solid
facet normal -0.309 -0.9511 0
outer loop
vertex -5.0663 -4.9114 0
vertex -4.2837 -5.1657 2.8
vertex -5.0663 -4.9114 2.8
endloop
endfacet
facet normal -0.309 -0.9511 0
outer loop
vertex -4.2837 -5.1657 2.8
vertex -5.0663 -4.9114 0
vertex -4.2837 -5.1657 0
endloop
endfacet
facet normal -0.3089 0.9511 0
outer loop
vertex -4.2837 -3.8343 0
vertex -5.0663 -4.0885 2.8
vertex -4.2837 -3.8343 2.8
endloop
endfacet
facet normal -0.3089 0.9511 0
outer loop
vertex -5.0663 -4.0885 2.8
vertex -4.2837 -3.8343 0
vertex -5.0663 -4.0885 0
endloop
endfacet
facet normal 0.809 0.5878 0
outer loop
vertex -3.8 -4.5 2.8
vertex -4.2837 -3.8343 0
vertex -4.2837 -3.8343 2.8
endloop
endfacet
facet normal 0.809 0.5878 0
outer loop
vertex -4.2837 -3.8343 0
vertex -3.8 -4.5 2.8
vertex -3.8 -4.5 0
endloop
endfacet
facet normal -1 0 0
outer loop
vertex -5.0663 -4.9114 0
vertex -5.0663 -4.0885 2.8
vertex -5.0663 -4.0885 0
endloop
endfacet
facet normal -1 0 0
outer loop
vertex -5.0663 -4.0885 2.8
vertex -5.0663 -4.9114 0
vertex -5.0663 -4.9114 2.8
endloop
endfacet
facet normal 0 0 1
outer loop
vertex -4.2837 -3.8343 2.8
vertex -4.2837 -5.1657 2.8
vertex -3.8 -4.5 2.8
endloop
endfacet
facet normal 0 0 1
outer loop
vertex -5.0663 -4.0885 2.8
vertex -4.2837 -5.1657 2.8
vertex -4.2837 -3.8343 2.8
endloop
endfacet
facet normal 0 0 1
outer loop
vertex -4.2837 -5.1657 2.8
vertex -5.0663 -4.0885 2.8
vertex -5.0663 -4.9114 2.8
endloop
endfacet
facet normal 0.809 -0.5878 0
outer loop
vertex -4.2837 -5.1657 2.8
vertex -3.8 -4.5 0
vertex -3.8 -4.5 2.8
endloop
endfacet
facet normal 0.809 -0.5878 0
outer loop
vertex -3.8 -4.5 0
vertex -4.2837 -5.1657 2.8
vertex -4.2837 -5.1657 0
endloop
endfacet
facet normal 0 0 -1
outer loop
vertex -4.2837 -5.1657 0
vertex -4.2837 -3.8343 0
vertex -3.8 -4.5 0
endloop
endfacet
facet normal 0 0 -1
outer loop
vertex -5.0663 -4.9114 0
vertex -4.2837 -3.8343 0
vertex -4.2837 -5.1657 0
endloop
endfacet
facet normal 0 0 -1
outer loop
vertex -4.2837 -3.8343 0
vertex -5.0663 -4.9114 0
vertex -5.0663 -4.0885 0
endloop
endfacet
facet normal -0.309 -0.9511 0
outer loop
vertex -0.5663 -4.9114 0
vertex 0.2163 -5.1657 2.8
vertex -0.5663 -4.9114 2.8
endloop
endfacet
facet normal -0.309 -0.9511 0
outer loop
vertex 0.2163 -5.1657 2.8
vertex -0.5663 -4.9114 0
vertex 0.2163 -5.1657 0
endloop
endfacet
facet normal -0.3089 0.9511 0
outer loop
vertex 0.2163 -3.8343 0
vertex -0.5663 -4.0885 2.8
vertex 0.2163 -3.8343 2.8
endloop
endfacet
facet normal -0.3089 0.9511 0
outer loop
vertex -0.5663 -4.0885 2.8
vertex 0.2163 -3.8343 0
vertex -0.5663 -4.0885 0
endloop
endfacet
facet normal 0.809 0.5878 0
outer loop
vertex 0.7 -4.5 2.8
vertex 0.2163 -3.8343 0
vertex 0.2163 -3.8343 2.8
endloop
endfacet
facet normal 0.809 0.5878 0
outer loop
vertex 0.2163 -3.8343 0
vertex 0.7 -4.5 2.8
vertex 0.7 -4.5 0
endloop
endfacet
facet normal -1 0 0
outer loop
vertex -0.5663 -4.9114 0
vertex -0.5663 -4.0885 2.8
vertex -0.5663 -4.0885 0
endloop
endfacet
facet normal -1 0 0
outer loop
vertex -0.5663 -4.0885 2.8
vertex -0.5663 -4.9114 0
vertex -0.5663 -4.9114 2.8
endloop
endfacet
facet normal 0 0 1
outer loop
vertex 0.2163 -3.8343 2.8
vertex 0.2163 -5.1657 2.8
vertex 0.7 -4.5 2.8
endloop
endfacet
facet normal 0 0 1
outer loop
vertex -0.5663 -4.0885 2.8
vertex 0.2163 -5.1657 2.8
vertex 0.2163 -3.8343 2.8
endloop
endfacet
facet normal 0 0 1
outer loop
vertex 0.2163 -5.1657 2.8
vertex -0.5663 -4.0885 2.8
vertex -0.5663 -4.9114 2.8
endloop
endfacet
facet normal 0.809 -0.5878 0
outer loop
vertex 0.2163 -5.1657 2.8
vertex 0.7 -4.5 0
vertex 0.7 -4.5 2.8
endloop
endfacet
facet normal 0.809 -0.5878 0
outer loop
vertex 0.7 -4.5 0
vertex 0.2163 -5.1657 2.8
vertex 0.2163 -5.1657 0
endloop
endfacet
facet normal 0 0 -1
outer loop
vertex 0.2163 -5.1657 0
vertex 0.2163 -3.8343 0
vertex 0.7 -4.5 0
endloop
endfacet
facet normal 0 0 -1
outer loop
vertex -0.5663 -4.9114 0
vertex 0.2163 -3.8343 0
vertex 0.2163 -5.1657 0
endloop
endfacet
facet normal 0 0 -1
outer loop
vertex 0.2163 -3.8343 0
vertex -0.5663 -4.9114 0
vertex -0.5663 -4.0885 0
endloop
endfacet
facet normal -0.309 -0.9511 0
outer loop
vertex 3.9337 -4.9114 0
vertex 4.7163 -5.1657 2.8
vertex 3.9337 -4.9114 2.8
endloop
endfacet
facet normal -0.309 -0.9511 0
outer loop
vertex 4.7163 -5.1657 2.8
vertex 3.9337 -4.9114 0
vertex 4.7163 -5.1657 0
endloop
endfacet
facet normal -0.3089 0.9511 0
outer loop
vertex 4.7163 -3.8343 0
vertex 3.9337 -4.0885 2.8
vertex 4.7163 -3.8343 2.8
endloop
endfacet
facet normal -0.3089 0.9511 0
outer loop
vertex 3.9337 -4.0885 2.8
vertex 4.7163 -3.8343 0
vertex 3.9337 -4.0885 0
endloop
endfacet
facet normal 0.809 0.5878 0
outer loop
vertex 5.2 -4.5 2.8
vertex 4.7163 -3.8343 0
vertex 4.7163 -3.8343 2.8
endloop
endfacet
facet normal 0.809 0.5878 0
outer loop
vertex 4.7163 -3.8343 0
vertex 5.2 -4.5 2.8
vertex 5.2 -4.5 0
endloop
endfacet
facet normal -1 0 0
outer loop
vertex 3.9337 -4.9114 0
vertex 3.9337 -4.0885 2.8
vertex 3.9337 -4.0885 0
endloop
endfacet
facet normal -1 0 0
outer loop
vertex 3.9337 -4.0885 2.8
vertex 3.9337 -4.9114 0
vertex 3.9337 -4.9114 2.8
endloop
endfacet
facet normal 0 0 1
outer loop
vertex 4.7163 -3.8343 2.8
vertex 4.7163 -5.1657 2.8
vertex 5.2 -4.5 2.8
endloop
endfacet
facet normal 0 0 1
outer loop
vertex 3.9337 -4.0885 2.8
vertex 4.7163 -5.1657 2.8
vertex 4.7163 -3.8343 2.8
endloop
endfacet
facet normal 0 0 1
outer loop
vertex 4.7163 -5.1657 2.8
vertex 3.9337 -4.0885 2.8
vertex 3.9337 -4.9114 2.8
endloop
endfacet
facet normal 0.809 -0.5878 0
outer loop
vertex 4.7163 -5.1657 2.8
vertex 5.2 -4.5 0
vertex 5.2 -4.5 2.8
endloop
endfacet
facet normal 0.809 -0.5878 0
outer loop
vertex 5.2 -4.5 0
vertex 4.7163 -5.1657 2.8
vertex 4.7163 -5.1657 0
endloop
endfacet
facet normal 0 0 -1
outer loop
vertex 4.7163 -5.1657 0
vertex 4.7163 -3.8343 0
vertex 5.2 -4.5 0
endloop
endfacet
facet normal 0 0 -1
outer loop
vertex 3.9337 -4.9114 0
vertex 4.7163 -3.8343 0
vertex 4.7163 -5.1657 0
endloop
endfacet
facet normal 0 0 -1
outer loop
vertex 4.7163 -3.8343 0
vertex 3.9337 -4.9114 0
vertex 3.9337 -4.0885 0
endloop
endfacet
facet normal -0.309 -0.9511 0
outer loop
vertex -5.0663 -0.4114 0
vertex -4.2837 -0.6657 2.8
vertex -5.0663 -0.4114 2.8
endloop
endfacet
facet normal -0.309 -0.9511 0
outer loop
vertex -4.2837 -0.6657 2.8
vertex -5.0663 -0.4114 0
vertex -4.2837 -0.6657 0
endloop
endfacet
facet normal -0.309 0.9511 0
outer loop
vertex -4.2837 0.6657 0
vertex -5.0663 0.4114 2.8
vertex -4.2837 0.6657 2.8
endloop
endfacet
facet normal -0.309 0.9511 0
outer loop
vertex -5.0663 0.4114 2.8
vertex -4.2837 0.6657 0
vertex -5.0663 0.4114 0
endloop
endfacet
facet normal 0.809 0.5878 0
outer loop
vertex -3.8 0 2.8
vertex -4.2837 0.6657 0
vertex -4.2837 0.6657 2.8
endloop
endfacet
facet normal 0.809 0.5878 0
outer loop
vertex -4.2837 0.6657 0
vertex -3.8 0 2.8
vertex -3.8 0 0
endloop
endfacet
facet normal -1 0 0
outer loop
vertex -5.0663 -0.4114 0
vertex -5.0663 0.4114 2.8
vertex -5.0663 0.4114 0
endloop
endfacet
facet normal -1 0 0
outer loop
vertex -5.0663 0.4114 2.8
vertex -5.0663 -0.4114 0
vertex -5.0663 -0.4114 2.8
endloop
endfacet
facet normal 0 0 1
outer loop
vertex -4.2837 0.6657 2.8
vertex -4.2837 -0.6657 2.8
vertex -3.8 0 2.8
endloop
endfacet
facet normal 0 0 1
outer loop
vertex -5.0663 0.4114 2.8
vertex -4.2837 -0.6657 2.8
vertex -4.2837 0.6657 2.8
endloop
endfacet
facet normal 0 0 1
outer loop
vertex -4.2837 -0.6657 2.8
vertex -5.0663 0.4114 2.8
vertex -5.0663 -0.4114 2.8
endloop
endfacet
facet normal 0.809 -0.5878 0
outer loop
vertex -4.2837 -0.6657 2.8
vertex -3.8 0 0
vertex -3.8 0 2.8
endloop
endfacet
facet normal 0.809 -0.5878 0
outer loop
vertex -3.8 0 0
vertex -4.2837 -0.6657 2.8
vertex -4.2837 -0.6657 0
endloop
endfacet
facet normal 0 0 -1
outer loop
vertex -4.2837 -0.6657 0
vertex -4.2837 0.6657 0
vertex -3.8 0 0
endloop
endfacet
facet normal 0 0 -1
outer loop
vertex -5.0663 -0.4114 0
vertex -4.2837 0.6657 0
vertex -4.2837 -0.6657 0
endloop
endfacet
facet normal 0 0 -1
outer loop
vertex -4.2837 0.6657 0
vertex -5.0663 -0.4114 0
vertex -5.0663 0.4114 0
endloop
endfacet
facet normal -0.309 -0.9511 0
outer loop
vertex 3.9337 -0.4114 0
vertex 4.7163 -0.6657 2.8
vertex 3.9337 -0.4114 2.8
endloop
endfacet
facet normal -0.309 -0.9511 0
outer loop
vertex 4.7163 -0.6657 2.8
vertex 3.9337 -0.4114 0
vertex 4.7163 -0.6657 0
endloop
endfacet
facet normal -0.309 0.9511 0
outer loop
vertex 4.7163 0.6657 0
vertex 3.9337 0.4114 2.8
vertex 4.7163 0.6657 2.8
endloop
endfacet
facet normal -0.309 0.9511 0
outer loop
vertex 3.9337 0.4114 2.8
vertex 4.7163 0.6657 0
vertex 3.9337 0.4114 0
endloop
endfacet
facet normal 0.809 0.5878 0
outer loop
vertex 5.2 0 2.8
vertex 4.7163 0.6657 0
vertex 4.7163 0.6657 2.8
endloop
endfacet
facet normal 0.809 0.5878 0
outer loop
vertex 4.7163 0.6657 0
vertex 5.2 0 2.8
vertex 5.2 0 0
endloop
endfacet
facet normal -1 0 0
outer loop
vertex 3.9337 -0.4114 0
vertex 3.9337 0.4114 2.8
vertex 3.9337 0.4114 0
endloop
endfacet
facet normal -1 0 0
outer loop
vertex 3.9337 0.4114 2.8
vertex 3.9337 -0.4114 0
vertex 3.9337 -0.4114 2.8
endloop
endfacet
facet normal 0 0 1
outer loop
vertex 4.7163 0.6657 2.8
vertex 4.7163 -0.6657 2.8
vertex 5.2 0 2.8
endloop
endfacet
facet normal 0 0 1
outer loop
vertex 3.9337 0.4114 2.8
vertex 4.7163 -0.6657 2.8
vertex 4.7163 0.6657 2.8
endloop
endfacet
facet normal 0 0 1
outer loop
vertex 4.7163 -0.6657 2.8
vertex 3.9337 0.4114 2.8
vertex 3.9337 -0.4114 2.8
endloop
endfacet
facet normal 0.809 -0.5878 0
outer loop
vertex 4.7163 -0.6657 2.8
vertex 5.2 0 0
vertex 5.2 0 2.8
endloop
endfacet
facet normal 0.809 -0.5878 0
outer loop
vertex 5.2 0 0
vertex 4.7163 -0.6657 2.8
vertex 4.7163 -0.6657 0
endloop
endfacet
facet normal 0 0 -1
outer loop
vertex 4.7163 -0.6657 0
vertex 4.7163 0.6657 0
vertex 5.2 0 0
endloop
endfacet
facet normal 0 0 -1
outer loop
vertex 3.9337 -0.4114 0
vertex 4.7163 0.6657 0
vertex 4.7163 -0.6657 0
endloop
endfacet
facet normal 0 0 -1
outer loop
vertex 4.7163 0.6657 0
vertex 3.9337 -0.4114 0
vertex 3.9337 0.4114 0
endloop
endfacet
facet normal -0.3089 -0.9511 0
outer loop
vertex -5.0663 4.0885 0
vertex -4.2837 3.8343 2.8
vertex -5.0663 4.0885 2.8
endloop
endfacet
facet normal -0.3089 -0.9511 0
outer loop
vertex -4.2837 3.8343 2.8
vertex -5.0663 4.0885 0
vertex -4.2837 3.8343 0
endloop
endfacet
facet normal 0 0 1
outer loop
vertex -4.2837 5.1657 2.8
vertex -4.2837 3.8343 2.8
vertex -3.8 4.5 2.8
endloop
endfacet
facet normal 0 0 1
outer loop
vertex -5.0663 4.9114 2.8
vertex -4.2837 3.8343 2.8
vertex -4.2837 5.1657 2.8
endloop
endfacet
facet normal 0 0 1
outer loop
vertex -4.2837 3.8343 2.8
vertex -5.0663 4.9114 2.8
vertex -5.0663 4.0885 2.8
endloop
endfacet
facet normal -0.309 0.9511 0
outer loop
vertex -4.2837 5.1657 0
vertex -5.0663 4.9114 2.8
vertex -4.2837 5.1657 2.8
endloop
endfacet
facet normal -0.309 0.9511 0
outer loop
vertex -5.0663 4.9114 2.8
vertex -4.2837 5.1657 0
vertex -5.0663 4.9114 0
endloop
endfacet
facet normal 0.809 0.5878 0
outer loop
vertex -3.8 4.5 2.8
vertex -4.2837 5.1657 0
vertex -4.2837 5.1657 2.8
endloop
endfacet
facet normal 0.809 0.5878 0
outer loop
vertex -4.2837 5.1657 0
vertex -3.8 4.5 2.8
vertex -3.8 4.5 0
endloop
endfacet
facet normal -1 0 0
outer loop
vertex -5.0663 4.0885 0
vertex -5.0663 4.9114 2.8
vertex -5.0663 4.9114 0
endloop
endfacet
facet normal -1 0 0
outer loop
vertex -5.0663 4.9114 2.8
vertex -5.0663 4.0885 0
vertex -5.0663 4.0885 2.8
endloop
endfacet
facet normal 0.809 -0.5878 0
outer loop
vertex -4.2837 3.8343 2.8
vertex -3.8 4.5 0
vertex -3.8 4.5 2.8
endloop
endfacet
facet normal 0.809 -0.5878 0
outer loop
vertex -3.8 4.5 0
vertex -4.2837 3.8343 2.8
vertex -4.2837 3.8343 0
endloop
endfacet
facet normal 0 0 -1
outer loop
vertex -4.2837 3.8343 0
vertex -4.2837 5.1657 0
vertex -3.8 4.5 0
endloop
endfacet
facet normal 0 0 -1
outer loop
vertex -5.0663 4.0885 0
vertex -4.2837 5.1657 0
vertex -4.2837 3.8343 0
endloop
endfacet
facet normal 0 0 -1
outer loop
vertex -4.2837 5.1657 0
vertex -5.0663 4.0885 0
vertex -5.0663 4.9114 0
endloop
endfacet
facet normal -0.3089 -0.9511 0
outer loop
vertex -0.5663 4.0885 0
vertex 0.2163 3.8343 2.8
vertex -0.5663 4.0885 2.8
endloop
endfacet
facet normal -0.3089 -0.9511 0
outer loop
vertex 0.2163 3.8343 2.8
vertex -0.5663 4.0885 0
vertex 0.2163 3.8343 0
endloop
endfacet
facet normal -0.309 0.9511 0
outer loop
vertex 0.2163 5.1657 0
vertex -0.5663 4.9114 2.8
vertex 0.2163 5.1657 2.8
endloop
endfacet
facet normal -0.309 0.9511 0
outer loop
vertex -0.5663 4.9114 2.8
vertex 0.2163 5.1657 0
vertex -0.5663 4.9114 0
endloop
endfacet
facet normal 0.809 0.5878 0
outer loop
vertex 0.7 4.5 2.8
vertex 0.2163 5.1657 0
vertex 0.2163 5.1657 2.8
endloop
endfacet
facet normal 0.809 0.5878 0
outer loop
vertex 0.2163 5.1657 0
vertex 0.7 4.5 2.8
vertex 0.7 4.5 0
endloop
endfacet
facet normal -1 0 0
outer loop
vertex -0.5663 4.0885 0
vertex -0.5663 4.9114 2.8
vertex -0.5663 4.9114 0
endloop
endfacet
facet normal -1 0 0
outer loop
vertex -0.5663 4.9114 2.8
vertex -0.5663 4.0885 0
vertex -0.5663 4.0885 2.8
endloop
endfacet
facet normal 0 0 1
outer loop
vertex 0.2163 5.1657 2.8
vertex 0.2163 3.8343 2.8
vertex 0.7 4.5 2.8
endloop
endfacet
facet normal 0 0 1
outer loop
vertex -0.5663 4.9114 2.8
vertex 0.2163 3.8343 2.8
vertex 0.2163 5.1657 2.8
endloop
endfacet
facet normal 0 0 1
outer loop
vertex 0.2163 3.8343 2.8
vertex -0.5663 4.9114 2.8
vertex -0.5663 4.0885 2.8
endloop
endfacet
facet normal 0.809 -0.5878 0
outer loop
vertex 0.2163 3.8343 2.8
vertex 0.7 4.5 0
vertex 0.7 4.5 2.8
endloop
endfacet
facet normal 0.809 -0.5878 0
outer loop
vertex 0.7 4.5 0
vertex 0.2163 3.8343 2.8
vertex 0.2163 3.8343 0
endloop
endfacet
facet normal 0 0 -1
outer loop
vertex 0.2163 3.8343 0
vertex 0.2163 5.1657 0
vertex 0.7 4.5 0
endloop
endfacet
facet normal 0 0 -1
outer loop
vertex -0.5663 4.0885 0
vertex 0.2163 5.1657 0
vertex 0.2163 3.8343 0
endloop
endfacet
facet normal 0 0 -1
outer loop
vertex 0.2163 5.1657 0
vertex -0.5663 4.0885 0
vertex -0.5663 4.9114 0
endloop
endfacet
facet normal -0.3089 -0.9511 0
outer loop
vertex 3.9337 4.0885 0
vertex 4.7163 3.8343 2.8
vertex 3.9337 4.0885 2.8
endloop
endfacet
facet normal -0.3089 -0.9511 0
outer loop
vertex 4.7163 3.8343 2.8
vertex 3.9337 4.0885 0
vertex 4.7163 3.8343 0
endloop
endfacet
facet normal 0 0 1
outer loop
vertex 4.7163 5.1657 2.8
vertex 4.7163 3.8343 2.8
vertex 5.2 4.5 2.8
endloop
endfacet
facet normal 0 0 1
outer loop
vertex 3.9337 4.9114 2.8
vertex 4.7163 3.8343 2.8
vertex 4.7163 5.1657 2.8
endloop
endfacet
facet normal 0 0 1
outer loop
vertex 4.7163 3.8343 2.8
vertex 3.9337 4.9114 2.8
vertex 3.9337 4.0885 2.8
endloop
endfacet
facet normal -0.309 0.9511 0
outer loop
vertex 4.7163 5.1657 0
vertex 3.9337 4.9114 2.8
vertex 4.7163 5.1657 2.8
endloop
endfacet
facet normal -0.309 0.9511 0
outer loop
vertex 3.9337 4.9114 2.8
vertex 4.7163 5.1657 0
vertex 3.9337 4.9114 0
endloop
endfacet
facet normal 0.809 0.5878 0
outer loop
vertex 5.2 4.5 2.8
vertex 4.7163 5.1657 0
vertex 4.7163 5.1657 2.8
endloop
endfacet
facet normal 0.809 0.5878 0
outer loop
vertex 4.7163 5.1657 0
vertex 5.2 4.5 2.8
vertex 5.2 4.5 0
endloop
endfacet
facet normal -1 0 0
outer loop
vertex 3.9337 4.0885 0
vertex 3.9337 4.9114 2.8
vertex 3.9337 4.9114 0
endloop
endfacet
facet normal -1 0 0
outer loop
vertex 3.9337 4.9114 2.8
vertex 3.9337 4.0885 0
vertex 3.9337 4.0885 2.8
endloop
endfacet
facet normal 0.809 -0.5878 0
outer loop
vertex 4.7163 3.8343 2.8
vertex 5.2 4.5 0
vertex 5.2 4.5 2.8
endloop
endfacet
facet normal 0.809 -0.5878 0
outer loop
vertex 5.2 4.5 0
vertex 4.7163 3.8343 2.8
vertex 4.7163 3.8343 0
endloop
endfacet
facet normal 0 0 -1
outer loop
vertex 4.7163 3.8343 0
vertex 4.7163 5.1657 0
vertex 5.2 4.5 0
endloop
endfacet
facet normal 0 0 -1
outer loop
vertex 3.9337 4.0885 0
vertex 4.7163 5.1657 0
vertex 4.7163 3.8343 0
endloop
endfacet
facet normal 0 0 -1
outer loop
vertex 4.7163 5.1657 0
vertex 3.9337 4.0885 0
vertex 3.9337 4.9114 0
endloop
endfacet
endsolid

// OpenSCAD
union() {
  translate([-4.5, -4.5, 0.0]) cylinder(r=0.7, h=2.8);
  translate([0.0, -4.5, 0.0]) cylinder(r=0.7, h=2.8);
  translate([4.5, -4.5, 0.0]) cylinder(r=0.7, h=2.8);
  translate([-4.5, 0.0, 0.0]) cylinder(r=0.7, h=2.8);
  translate([4.5, 0.0, 0.0]) cylinder(r=0.7, h=2.8);
  translate([-4.5, 4.5, 0.0]) cylinder(r=0.7, h=2.8);
  translate([0.0, 4.5, 0.0]) cylinder(r=0.7, h=2.8);
  translate([4.5, 4.5, 0.0]) cylinder(r=0.7, h=2.8);
}
